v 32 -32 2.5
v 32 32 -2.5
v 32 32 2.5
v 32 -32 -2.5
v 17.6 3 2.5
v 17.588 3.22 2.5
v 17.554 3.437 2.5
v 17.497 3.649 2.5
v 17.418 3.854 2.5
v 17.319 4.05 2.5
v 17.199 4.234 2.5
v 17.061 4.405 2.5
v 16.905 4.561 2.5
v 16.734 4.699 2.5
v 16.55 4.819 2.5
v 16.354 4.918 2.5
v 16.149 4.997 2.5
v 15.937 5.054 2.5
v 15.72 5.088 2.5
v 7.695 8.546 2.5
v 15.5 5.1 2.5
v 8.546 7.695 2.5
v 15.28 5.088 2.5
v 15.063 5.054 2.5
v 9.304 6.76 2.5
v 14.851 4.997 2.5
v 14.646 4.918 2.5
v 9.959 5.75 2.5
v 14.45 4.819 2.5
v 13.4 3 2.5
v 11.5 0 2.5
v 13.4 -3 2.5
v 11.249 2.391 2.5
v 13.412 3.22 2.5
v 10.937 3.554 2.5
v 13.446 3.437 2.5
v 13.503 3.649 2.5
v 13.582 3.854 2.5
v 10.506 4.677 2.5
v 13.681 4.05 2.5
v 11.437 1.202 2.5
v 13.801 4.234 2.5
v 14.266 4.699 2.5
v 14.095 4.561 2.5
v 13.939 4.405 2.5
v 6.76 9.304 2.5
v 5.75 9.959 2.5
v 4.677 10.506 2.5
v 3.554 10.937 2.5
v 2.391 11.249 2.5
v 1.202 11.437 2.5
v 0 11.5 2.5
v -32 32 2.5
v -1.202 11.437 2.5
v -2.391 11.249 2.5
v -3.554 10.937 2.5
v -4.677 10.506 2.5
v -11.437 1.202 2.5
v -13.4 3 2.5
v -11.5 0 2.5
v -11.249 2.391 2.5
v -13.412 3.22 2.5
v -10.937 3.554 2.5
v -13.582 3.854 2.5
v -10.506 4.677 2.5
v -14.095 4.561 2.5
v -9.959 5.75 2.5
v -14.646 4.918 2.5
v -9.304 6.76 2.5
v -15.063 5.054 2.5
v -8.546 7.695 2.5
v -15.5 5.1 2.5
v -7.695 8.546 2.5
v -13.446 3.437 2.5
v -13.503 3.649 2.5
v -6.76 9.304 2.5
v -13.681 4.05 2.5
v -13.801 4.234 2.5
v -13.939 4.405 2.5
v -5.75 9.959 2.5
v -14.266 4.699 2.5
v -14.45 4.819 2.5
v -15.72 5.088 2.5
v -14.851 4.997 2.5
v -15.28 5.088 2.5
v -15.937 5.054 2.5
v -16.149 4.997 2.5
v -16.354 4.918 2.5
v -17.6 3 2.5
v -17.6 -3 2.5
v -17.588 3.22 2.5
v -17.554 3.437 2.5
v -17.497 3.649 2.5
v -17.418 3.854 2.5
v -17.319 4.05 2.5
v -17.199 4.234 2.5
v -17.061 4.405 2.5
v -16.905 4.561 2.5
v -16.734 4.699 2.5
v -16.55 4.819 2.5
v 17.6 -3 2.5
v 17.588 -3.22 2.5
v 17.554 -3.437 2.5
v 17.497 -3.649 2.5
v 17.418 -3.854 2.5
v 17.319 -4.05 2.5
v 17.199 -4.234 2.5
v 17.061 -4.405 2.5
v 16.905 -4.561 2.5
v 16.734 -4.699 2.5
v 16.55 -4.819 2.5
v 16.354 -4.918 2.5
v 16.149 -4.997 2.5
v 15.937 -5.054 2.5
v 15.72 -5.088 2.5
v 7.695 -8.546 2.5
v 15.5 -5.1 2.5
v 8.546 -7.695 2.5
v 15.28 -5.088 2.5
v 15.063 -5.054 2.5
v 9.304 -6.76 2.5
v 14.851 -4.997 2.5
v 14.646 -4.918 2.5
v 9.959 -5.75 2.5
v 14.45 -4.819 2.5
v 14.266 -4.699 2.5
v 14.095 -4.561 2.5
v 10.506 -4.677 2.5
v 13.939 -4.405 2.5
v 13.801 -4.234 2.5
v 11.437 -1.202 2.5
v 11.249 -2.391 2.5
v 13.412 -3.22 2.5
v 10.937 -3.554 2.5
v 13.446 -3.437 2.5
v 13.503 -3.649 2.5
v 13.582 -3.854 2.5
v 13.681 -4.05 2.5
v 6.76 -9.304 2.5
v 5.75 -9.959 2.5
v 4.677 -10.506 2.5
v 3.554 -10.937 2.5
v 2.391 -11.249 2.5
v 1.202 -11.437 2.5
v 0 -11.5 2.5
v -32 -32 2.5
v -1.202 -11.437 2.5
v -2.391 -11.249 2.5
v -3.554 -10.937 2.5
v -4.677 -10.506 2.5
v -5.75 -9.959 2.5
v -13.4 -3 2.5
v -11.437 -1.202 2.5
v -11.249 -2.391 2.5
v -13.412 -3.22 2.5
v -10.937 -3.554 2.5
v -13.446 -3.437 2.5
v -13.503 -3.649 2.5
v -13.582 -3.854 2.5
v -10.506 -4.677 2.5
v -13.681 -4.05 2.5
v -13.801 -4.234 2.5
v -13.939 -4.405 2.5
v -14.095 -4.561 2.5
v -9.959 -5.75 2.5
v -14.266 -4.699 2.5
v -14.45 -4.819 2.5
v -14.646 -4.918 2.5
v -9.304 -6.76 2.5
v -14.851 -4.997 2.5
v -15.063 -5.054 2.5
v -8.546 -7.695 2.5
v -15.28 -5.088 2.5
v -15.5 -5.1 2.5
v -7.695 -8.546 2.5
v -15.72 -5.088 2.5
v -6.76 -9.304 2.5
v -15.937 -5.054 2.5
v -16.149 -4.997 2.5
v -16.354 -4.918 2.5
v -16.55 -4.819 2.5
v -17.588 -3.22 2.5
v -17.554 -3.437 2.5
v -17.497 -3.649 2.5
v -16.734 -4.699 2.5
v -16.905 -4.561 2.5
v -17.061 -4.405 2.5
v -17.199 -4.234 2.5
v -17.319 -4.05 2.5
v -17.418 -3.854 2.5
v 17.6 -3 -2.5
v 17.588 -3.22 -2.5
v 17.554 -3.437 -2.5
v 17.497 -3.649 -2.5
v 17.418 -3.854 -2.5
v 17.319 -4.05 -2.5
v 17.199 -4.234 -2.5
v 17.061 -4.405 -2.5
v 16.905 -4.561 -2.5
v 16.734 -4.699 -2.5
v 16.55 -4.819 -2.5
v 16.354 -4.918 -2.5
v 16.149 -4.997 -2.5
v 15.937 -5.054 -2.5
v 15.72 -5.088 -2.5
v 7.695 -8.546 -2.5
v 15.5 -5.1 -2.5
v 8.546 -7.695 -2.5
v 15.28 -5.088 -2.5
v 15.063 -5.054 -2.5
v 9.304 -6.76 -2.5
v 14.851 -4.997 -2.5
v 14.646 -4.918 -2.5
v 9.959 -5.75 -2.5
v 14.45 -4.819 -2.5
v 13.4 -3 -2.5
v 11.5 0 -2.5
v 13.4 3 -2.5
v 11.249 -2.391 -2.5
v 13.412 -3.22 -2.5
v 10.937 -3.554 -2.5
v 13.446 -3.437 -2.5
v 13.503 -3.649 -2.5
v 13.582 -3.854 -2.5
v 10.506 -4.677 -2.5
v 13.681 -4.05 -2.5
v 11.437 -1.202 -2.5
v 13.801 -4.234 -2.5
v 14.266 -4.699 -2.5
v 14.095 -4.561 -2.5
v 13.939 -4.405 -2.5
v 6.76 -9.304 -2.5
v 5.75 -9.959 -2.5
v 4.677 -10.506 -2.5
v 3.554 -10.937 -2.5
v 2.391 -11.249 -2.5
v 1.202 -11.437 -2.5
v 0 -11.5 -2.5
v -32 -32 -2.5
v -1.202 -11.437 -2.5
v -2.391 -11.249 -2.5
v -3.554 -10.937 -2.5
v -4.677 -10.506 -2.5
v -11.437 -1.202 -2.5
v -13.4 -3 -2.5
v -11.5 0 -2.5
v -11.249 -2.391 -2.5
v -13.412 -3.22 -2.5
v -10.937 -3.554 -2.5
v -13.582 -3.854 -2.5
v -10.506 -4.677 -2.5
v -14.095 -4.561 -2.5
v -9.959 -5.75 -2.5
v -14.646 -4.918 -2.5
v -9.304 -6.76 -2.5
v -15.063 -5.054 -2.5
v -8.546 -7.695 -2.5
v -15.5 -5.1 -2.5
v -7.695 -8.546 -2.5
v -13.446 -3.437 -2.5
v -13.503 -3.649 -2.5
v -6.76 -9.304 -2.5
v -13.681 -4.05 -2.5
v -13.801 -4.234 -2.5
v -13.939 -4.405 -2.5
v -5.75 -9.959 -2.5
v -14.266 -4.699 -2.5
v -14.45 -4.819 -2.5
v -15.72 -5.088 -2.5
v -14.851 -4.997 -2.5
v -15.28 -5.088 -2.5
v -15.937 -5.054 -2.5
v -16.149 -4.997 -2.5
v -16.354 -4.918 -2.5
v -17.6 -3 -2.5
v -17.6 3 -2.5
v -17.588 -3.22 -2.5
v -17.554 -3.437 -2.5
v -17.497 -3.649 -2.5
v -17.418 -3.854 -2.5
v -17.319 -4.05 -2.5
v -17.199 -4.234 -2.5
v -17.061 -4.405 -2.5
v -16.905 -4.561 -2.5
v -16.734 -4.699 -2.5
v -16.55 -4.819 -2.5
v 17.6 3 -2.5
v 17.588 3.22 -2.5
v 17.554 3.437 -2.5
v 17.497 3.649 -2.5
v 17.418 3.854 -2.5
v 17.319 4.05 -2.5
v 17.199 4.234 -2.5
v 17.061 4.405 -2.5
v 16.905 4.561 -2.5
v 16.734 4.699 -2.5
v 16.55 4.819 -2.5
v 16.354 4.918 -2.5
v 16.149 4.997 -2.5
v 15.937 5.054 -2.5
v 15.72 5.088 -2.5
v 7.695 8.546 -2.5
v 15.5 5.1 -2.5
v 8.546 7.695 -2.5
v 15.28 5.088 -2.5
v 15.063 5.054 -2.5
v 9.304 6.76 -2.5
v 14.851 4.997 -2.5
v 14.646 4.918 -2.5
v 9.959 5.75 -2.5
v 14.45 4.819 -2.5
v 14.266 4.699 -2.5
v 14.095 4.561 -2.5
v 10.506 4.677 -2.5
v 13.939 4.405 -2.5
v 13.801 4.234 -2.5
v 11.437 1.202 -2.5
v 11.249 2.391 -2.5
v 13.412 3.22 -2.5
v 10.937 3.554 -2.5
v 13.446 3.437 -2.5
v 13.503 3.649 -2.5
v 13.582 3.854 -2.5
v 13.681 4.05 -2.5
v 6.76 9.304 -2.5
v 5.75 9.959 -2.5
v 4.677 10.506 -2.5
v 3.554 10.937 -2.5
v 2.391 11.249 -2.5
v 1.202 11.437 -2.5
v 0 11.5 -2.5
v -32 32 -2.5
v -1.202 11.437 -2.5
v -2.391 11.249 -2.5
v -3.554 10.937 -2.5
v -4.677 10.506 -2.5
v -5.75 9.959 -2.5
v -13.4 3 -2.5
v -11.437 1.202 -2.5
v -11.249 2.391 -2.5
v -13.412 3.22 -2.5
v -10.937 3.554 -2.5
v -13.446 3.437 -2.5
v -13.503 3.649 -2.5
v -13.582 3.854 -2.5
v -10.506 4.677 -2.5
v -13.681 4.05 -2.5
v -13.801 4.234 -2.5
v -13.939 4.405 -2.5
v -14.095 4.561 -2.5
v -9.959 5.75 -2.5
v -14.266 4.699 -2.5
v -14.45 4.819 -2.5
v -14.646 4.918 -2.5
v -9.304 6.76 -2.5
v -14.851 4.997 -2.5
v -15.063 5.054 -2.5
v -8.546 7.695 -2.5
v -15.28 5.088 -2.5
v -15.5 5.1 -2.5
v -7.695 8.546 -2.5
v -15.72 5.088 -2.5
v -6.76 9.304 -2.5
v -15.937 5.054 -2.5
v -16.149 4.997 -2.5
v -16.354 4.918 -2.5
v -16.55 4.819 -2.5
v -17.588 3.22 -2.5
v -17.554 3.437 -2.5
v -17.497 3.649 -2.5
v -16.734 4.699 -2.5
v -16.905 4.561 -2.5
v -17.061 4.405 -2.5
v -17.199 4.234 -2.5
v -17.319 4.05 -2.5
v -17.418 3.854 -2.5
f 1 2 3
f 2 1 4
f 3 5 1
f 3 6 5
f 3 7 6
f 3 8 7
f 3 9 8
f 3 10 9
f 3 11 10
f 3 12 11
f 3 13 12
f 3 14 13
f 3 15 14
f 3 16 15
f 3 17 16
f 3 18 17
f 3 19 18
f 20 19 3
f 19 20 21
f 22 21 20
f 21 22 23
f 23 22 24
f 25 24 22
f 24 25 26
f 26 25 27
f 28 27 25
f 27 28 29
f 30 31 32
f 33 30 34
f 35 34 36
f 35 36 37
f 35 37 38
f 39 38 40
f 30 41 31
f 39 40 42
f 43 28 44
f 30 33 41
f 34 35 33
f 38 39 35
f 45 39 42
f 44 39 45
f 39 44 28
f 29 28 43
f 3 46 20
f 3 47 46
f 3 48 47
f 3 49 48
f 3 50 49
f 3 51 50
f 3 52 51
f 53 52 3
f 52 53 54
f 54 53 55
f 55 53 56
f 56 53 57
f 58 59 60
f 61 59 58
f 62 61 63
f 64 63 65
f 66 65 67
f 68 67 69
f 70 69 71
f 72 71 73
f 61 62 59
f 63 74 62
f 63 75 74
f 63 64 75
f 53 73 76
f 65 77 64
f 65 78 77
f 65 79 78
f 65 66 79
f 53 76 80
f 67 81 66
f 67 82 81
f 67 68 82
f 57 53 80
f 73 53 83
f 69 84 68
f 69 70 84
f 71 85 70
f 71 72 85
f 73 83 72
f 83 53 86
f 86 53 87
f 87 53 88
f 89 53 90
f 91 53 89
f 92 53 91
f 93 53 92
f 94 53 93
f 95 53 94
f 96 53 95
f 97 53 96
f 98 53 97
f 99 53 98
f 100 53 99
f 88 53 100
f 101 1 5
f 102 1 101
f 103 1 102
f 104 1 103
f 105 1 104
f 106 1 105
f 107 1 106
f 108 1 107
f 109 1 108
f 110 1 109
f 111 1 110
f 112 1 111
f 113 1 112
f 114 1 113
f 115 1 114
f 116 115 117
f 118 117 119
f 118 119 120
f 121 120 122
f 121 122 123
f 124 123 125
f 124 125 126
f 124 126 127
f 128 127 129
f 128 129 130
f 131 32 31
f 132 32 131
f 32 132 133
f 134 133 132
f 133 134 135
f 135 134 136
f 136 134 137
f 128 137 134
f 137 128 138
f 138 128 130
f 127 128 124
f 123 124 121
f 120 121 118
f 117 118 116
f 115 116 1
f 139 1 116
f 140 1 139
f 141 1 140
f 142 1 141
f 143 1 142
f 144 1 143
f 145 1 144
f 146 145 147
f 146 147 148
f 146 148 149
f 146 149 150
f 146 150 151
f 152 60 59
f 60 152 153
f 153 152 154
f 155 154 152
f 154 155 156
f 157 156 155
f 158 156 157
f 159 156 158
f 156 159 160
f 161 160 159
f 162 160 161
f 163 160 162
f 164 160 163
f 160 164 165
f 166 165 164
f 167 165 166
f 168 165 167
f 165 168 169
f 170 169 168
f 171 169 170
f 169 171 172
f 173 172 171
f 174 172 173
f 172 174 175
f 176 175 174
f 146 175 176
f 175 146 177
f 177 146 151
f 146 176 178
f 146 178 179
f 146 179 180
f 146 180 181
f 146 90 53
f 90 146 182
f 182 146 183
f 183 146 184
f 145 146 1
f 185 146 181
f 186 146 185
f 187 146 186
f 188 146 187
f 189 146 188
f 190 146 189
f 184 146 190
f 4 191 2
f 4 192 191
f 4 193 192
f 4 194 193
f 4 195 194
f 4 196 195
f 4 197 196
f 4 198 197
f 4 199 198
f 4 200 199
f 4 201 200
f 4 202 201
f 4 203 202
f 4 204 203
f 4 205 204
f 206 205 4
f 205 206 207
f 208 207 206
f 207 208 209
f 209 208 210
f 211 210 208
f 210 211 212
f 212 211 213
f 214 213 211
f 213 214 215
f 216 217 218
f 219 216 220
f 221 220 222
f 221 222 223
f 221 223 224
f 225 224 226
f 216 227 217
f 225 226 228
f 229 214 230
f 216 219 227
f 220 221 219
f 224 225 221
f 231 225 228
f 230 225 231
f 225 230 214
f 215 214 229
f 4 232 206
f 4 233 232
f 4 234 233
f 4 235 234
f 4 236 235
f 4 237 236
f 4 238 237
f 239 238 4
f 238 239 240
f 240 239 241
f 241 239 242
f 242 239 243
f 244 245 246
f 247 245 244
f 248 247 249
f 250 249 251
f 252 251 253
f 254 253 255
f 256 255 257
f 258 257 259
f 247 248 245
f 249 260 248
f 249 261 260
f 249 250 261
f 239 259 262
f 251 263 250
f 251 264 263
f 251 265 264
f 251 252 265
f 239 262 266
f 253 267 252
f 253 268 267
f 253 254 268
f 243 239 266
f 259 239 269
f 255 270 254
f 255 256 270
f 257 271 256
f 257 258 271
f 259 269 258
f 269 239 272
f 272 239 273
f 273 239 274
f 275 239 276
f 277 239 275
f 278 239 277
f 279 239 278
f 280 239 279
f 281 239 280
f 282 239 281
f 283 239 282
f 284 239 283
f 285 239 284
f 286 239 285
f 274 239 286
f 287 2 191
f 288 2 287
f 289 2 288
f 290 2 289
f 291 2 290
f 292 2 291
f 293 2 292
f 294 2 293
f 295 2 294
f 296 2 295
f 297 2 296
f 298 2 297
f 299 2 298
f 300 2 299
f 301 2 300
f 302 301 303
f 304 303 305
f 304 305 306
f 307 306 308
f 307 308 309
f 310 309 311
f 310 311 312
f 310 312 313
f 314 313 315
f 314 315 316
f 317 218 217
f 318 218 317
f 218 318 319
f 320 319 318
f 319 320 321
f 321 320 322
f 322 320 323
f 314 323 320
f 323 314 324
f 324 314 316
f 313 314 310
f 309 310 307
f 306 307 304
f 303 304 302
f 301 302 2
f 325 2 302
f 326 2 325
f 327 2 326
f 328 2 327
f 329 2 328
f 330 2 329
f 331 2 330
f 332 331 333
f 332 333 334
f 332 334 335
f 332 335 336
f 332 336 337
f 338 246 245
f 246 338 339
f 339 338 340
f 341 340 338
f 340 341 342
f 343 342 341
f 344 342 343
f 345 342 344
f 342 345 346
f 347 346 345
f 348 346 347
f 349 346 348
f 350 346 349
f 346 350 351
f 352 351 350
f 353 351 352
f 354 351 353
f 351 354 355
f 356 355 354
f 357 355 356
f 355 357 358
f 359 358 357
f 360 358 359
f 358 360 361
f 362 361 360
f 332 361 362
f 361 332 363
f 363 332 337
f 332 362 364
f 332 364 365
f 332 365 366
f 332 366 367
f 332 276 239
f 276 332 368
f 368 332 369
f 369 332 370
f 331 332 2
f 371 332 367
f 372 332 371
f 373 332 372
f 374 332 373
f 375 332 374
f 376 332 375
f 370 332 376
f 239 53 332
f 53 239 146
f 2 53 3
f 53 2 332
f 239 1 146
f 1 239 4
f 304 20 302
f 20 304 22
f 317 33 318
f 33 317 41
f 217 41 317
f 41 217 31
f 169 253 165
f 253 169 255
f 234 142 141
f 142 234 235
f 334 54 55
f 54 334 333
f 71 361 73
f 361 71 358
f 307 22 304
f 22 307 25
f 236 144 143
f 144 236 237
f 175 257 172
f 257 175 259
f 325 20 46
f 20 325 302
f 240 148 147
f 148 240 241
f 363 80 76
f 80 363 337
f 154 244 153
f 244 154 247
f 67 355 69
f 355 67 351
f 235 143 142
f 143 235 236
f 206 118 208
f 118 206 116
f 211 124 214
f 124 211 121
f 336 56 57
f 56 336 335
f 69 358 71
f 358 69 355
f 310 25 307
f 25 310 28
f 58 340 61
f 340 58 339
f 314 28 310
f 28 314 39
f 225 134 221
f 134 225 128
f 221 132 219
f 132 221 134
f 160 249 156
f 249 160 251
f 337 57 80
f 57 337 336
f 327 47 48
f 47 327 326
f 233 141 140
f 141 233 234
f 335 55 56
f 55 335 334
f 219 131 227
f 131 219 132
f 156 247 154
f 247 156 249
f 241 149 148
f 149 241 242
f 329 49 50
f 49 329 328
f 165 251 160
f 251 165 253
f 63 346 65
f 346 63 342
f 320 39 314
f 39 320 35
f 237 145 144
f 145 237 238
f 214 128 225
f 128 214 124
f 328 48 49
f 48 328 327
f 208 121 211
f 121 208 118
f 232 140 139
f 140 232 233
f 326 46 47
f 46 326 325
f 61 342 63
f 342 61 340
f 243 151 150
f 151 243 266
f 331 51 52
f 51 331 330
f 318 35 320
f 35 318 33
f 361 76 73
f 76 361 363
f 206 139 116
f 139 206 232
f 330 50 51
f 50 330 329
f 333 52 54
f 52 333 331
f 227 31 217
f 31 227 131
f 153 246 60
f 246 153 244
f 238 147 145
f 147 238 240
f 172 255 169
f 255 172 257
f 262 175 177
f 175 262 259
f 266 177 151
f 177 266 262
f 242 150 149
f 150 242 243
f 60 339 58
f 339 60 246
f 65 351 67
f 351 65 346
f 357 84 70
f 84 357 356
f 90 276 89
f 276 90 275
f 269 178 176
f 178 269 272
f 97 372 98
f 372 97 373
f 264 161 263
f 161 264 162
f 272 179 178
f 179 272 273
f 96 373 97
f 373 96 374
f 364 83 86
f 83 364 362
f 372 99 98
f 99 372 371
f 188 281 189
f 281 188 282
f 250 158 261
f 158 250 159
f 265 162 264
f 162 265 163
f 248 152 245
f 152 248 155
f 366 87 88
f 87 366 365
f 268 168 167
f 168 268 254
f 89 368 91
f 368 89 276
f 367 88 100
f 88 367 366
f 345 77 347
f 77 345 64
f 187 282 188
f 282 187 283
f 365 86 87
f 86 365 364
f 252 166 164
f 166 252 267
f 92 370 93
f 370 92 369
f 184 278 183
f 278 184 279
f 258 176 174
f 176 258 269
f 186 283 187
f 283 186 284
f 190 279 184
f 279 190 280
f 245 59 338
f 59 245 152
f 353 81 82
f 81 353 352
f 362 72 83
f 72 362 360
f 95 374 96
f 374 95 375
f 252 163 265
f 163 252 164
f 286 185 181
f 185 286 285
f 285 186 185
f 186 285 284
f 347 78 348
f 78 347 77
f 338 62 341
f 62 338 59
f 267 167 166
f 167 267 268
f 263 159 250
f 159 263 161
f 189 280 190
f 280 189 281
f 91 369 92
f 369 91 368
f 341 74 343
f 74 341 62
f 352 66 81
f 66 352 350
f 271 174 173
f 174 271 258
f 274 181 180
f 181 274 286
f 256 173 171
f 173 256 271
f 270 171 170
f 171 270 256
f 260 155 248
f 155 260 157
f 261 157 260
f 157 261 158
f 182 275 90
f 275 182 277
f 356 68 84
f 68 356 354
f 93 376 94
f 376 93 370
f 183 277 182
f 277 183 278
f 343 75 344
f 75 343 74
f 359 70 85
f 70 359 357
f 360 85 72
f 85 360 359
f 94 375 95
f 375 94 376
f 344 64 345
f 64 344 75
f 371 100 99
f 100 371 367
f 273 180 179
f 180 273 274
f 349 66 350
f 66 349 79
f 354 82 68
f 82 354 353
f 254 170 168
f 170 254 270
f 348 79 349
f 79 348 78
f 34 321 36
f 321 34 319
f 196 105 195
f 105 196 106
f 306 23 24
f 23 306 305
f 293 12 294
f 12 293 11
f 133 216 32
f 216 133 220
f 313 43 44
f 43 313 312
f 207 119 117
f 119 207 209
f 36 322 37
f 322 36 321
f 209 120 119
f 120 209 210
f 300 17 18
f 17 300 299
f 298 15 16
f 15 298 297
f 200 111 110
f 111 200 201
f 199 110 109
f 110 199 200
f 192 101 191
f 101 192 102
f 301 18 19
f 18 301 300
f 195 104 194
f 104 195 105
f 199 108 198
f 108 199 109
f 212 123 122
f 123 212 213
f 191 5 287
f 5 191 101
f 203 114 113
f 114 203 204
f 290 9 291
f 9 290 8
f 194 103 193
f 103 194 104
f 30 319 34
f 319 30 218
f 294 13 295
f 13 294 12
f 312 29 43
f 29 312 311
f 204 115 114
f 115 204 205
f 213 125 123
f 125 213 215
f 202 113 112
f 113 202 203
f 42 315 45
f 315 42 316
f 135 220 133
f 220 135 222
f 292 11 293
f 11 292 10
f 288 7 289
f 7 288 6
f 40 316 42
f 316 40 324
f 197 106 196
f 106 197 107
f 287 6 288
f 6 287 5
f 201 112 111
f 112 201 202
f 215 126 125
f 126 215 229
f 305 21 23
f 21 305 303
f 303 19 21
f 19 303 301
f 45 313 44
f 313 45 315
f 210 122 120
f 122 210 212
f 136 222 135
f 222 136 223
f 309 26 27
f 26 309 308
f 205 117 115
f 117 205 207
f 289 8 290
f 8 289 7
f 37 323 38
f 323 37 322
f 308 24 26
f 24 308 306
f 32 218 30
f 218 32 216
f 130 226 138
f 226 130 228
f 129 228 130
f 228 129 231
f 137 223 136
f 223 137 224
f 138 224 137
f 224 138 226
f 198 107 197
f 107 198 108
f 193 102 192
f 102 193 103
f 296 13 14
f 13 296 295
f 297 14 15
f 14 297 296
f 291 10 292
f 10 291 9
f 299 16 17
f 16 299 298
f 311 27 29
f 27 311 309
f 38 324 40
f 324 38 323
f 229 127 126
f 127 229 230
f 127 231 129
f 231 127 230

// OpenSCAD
// NEMA 17 adjustable motor plate, 64 mm square.
$fn = 60;
eps = 0.02;
plate = 64;
plate_t = 5;
hole_pitch = 31;
center_d = 23;
slot_l = 6;
slot_d = 4.2;
module slot(x) {
    hull() {
        translate([x, -slot_l / 2, -plate_t / 2 - eps]) cylinder(d = slot_d, h = plate_t + 2 * eps);
        translate([x, slot_l / 2, -plate_t / 2 - eps]) cylinder(d = slot_d, h = plate_t + 2 * eps);
    }
}
difference() {
    cube([plate, plate, plate_t], center = true);
    translate([0, 0, -plate_t / 2 - eps]) cylinder(d = center_d, h = plate_t + 2 * eps);
    slot(-hole_pitch / 2);
    slot(hole_pitch / 2);
}
